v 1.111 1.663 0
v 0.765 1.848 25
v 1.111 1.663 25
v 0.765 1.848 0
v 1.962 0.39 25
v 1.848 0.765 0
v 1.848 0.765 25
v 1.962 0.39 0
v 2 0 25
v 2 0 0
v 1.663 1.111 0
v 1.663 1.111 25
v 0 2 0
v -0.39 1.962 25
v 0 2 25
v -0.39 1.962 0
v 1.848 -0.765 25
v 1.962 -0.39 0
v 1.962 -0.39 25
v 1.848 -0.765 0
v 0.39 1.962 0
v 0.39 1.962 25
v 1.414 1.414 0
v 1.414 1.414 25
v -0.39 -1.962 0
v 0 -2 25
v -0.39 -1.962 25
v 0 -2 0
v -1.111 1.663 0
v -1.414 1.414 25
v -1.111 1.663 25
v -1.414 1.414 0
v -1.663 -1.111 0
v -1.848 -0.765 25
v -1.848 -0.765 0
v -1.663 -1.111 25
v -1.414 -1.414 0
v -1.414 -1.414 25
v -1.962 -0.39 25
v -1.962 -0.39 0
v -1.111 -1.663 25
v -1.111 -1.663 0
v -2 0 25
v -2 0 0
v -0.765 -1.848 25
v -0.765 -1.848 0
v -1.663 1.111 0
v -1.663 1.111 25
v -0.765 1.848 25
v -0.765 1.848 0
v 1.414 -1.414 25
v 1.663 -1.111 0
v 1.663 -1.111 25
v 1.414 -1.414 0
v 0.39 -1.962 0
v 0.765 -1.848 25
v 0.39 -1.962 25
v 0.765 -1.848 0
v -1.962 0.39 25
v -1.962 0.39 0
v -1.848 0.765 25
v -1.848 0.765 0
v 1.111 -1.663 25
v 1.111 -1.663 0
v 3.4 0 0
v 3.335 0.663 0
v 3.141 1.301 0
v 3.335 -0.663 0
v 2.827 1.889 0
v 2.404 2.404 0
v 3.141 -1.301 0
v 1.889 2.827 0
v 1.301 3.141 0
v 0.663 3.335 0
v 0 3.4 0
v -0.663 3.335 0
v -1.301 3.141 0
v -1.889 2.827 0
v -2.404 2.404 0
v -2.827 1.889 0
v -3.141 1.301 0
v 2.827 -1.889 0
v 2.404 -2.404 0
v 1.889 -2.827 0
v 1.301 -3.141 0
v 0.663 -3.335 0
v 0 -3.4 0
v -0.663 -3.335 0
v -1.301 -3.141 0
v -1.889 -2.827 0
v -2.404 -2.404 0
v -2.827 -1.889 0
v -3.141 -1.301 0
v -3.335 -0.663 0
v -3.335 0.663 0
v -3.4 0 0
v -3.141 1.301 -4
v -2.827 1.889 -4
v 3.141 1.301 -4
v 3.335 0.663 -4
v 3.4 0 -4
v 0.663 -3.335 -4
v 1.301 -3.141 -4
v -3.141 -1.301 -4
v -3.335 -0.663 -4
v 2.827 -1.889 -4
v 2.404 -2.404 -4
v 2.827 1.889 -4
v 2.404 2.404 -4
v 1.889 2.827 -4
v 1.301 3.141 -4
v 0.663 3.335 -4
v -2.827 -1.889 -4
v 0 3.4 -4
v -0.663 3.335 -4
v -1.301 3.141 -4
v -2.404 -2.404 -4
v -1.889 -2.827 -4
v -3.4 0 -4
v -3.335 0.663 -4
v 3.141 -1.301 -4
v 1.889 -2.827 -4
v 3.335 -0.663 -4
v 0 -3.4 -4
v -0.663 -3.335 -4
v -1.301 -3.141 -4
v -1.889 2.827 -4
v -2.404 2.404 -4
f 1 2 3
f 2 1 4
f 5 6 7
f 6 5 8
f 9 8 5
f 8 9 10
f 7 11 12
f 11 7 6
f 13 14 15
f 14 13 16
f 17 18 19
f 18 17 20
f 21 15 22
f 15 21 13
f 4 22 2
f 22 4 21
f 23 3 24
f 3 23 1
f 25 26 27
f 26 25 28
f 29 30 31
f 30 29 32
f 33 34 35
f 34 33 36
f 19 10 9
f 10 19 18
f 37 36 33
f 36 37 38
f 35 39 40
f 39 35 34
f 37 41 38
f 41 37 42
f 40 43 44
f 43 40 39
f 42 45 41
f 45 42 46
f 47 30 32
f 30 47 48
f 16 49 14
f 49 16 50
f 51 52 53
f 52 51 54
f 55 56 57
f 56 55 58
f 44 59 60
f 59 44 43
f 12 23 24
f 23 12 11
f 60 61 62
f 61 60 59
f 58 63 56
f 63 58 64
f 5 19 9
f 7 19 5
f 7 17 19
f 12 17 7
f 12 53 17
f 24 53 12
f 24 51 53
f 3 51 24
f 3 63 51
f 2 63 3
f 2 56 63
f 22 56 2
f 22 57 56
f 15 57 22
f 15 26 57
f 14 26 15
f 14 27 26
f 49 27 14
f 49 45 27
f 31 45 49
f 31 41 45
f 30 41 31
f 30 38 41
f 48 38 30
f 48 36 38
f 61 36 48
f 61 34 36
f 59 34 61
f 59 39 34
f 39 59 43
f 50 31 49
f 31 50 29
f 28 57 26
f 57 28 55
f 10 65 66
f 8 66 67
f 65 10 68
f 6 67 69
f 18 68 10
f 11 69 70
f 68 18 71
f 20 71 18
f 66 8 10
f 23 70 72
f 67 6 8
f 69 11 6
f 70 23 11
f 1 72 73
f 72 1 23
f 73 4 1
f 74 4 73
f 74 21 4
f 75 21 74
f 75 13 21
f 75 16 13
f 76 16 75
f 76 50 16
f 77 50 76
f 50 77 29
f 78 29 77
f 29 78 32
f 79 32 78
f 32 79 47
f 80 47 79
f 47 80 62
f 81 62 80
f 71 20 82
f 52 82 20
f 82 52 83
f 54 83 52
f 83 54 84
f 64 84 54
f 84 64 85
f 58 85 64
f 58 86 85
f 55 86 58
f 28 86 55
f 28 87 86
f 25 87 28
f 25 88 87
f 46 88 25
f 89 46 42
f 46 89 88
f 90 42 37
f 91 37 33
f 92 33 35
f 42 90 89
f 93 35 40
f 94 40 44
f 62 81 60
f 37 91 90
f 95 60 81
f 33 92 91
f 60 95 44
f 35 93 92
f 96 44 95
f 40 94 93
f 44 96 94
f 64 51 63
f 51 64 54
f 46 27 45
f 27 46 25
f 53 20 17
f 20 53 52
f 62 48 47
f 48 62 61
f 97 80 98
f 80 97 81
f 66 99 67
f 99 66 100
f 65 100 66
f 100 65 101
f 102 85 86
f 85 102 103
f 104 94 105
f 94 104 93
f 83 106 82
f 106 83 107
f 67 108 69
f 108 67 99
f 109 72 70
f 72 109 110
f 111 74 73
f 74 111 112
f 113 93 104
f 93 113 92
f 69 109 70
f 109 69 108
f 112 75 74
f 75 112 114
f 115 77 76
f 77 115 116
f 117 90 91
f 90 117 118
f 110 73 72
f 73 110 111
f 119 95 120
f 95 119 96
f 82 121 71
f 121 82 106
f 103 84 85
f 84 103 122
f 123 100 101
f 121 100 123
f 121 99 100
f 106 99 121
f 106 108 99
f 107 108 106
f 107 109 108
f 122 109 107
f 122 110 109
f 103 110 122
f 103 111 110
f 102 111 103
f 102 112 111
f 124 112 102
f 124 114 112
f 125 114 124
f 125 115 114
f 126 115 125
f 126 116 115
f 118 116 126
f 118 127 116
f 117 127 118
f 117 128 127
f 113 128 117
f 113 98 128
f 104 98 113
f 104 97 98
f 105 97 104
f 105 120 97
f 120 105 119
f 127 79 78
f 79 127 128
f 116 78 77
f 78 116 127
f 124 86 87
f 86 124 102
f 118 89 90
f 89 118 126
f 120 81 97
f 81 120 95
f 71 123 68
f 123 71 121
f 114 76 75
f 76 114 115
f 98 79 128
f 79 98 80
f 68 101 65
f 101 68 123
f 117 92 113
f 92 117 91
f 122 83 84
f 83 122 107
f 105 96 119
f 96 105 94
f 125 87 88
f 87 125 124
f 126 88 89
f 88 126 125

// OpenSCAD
// Purchased hardware envelope; no modeled threads, not print.
$fn=32;
union(){cylinder(d=4,h=25);translate([0,0,-4])cylinder(d=6.8,h=4);}
